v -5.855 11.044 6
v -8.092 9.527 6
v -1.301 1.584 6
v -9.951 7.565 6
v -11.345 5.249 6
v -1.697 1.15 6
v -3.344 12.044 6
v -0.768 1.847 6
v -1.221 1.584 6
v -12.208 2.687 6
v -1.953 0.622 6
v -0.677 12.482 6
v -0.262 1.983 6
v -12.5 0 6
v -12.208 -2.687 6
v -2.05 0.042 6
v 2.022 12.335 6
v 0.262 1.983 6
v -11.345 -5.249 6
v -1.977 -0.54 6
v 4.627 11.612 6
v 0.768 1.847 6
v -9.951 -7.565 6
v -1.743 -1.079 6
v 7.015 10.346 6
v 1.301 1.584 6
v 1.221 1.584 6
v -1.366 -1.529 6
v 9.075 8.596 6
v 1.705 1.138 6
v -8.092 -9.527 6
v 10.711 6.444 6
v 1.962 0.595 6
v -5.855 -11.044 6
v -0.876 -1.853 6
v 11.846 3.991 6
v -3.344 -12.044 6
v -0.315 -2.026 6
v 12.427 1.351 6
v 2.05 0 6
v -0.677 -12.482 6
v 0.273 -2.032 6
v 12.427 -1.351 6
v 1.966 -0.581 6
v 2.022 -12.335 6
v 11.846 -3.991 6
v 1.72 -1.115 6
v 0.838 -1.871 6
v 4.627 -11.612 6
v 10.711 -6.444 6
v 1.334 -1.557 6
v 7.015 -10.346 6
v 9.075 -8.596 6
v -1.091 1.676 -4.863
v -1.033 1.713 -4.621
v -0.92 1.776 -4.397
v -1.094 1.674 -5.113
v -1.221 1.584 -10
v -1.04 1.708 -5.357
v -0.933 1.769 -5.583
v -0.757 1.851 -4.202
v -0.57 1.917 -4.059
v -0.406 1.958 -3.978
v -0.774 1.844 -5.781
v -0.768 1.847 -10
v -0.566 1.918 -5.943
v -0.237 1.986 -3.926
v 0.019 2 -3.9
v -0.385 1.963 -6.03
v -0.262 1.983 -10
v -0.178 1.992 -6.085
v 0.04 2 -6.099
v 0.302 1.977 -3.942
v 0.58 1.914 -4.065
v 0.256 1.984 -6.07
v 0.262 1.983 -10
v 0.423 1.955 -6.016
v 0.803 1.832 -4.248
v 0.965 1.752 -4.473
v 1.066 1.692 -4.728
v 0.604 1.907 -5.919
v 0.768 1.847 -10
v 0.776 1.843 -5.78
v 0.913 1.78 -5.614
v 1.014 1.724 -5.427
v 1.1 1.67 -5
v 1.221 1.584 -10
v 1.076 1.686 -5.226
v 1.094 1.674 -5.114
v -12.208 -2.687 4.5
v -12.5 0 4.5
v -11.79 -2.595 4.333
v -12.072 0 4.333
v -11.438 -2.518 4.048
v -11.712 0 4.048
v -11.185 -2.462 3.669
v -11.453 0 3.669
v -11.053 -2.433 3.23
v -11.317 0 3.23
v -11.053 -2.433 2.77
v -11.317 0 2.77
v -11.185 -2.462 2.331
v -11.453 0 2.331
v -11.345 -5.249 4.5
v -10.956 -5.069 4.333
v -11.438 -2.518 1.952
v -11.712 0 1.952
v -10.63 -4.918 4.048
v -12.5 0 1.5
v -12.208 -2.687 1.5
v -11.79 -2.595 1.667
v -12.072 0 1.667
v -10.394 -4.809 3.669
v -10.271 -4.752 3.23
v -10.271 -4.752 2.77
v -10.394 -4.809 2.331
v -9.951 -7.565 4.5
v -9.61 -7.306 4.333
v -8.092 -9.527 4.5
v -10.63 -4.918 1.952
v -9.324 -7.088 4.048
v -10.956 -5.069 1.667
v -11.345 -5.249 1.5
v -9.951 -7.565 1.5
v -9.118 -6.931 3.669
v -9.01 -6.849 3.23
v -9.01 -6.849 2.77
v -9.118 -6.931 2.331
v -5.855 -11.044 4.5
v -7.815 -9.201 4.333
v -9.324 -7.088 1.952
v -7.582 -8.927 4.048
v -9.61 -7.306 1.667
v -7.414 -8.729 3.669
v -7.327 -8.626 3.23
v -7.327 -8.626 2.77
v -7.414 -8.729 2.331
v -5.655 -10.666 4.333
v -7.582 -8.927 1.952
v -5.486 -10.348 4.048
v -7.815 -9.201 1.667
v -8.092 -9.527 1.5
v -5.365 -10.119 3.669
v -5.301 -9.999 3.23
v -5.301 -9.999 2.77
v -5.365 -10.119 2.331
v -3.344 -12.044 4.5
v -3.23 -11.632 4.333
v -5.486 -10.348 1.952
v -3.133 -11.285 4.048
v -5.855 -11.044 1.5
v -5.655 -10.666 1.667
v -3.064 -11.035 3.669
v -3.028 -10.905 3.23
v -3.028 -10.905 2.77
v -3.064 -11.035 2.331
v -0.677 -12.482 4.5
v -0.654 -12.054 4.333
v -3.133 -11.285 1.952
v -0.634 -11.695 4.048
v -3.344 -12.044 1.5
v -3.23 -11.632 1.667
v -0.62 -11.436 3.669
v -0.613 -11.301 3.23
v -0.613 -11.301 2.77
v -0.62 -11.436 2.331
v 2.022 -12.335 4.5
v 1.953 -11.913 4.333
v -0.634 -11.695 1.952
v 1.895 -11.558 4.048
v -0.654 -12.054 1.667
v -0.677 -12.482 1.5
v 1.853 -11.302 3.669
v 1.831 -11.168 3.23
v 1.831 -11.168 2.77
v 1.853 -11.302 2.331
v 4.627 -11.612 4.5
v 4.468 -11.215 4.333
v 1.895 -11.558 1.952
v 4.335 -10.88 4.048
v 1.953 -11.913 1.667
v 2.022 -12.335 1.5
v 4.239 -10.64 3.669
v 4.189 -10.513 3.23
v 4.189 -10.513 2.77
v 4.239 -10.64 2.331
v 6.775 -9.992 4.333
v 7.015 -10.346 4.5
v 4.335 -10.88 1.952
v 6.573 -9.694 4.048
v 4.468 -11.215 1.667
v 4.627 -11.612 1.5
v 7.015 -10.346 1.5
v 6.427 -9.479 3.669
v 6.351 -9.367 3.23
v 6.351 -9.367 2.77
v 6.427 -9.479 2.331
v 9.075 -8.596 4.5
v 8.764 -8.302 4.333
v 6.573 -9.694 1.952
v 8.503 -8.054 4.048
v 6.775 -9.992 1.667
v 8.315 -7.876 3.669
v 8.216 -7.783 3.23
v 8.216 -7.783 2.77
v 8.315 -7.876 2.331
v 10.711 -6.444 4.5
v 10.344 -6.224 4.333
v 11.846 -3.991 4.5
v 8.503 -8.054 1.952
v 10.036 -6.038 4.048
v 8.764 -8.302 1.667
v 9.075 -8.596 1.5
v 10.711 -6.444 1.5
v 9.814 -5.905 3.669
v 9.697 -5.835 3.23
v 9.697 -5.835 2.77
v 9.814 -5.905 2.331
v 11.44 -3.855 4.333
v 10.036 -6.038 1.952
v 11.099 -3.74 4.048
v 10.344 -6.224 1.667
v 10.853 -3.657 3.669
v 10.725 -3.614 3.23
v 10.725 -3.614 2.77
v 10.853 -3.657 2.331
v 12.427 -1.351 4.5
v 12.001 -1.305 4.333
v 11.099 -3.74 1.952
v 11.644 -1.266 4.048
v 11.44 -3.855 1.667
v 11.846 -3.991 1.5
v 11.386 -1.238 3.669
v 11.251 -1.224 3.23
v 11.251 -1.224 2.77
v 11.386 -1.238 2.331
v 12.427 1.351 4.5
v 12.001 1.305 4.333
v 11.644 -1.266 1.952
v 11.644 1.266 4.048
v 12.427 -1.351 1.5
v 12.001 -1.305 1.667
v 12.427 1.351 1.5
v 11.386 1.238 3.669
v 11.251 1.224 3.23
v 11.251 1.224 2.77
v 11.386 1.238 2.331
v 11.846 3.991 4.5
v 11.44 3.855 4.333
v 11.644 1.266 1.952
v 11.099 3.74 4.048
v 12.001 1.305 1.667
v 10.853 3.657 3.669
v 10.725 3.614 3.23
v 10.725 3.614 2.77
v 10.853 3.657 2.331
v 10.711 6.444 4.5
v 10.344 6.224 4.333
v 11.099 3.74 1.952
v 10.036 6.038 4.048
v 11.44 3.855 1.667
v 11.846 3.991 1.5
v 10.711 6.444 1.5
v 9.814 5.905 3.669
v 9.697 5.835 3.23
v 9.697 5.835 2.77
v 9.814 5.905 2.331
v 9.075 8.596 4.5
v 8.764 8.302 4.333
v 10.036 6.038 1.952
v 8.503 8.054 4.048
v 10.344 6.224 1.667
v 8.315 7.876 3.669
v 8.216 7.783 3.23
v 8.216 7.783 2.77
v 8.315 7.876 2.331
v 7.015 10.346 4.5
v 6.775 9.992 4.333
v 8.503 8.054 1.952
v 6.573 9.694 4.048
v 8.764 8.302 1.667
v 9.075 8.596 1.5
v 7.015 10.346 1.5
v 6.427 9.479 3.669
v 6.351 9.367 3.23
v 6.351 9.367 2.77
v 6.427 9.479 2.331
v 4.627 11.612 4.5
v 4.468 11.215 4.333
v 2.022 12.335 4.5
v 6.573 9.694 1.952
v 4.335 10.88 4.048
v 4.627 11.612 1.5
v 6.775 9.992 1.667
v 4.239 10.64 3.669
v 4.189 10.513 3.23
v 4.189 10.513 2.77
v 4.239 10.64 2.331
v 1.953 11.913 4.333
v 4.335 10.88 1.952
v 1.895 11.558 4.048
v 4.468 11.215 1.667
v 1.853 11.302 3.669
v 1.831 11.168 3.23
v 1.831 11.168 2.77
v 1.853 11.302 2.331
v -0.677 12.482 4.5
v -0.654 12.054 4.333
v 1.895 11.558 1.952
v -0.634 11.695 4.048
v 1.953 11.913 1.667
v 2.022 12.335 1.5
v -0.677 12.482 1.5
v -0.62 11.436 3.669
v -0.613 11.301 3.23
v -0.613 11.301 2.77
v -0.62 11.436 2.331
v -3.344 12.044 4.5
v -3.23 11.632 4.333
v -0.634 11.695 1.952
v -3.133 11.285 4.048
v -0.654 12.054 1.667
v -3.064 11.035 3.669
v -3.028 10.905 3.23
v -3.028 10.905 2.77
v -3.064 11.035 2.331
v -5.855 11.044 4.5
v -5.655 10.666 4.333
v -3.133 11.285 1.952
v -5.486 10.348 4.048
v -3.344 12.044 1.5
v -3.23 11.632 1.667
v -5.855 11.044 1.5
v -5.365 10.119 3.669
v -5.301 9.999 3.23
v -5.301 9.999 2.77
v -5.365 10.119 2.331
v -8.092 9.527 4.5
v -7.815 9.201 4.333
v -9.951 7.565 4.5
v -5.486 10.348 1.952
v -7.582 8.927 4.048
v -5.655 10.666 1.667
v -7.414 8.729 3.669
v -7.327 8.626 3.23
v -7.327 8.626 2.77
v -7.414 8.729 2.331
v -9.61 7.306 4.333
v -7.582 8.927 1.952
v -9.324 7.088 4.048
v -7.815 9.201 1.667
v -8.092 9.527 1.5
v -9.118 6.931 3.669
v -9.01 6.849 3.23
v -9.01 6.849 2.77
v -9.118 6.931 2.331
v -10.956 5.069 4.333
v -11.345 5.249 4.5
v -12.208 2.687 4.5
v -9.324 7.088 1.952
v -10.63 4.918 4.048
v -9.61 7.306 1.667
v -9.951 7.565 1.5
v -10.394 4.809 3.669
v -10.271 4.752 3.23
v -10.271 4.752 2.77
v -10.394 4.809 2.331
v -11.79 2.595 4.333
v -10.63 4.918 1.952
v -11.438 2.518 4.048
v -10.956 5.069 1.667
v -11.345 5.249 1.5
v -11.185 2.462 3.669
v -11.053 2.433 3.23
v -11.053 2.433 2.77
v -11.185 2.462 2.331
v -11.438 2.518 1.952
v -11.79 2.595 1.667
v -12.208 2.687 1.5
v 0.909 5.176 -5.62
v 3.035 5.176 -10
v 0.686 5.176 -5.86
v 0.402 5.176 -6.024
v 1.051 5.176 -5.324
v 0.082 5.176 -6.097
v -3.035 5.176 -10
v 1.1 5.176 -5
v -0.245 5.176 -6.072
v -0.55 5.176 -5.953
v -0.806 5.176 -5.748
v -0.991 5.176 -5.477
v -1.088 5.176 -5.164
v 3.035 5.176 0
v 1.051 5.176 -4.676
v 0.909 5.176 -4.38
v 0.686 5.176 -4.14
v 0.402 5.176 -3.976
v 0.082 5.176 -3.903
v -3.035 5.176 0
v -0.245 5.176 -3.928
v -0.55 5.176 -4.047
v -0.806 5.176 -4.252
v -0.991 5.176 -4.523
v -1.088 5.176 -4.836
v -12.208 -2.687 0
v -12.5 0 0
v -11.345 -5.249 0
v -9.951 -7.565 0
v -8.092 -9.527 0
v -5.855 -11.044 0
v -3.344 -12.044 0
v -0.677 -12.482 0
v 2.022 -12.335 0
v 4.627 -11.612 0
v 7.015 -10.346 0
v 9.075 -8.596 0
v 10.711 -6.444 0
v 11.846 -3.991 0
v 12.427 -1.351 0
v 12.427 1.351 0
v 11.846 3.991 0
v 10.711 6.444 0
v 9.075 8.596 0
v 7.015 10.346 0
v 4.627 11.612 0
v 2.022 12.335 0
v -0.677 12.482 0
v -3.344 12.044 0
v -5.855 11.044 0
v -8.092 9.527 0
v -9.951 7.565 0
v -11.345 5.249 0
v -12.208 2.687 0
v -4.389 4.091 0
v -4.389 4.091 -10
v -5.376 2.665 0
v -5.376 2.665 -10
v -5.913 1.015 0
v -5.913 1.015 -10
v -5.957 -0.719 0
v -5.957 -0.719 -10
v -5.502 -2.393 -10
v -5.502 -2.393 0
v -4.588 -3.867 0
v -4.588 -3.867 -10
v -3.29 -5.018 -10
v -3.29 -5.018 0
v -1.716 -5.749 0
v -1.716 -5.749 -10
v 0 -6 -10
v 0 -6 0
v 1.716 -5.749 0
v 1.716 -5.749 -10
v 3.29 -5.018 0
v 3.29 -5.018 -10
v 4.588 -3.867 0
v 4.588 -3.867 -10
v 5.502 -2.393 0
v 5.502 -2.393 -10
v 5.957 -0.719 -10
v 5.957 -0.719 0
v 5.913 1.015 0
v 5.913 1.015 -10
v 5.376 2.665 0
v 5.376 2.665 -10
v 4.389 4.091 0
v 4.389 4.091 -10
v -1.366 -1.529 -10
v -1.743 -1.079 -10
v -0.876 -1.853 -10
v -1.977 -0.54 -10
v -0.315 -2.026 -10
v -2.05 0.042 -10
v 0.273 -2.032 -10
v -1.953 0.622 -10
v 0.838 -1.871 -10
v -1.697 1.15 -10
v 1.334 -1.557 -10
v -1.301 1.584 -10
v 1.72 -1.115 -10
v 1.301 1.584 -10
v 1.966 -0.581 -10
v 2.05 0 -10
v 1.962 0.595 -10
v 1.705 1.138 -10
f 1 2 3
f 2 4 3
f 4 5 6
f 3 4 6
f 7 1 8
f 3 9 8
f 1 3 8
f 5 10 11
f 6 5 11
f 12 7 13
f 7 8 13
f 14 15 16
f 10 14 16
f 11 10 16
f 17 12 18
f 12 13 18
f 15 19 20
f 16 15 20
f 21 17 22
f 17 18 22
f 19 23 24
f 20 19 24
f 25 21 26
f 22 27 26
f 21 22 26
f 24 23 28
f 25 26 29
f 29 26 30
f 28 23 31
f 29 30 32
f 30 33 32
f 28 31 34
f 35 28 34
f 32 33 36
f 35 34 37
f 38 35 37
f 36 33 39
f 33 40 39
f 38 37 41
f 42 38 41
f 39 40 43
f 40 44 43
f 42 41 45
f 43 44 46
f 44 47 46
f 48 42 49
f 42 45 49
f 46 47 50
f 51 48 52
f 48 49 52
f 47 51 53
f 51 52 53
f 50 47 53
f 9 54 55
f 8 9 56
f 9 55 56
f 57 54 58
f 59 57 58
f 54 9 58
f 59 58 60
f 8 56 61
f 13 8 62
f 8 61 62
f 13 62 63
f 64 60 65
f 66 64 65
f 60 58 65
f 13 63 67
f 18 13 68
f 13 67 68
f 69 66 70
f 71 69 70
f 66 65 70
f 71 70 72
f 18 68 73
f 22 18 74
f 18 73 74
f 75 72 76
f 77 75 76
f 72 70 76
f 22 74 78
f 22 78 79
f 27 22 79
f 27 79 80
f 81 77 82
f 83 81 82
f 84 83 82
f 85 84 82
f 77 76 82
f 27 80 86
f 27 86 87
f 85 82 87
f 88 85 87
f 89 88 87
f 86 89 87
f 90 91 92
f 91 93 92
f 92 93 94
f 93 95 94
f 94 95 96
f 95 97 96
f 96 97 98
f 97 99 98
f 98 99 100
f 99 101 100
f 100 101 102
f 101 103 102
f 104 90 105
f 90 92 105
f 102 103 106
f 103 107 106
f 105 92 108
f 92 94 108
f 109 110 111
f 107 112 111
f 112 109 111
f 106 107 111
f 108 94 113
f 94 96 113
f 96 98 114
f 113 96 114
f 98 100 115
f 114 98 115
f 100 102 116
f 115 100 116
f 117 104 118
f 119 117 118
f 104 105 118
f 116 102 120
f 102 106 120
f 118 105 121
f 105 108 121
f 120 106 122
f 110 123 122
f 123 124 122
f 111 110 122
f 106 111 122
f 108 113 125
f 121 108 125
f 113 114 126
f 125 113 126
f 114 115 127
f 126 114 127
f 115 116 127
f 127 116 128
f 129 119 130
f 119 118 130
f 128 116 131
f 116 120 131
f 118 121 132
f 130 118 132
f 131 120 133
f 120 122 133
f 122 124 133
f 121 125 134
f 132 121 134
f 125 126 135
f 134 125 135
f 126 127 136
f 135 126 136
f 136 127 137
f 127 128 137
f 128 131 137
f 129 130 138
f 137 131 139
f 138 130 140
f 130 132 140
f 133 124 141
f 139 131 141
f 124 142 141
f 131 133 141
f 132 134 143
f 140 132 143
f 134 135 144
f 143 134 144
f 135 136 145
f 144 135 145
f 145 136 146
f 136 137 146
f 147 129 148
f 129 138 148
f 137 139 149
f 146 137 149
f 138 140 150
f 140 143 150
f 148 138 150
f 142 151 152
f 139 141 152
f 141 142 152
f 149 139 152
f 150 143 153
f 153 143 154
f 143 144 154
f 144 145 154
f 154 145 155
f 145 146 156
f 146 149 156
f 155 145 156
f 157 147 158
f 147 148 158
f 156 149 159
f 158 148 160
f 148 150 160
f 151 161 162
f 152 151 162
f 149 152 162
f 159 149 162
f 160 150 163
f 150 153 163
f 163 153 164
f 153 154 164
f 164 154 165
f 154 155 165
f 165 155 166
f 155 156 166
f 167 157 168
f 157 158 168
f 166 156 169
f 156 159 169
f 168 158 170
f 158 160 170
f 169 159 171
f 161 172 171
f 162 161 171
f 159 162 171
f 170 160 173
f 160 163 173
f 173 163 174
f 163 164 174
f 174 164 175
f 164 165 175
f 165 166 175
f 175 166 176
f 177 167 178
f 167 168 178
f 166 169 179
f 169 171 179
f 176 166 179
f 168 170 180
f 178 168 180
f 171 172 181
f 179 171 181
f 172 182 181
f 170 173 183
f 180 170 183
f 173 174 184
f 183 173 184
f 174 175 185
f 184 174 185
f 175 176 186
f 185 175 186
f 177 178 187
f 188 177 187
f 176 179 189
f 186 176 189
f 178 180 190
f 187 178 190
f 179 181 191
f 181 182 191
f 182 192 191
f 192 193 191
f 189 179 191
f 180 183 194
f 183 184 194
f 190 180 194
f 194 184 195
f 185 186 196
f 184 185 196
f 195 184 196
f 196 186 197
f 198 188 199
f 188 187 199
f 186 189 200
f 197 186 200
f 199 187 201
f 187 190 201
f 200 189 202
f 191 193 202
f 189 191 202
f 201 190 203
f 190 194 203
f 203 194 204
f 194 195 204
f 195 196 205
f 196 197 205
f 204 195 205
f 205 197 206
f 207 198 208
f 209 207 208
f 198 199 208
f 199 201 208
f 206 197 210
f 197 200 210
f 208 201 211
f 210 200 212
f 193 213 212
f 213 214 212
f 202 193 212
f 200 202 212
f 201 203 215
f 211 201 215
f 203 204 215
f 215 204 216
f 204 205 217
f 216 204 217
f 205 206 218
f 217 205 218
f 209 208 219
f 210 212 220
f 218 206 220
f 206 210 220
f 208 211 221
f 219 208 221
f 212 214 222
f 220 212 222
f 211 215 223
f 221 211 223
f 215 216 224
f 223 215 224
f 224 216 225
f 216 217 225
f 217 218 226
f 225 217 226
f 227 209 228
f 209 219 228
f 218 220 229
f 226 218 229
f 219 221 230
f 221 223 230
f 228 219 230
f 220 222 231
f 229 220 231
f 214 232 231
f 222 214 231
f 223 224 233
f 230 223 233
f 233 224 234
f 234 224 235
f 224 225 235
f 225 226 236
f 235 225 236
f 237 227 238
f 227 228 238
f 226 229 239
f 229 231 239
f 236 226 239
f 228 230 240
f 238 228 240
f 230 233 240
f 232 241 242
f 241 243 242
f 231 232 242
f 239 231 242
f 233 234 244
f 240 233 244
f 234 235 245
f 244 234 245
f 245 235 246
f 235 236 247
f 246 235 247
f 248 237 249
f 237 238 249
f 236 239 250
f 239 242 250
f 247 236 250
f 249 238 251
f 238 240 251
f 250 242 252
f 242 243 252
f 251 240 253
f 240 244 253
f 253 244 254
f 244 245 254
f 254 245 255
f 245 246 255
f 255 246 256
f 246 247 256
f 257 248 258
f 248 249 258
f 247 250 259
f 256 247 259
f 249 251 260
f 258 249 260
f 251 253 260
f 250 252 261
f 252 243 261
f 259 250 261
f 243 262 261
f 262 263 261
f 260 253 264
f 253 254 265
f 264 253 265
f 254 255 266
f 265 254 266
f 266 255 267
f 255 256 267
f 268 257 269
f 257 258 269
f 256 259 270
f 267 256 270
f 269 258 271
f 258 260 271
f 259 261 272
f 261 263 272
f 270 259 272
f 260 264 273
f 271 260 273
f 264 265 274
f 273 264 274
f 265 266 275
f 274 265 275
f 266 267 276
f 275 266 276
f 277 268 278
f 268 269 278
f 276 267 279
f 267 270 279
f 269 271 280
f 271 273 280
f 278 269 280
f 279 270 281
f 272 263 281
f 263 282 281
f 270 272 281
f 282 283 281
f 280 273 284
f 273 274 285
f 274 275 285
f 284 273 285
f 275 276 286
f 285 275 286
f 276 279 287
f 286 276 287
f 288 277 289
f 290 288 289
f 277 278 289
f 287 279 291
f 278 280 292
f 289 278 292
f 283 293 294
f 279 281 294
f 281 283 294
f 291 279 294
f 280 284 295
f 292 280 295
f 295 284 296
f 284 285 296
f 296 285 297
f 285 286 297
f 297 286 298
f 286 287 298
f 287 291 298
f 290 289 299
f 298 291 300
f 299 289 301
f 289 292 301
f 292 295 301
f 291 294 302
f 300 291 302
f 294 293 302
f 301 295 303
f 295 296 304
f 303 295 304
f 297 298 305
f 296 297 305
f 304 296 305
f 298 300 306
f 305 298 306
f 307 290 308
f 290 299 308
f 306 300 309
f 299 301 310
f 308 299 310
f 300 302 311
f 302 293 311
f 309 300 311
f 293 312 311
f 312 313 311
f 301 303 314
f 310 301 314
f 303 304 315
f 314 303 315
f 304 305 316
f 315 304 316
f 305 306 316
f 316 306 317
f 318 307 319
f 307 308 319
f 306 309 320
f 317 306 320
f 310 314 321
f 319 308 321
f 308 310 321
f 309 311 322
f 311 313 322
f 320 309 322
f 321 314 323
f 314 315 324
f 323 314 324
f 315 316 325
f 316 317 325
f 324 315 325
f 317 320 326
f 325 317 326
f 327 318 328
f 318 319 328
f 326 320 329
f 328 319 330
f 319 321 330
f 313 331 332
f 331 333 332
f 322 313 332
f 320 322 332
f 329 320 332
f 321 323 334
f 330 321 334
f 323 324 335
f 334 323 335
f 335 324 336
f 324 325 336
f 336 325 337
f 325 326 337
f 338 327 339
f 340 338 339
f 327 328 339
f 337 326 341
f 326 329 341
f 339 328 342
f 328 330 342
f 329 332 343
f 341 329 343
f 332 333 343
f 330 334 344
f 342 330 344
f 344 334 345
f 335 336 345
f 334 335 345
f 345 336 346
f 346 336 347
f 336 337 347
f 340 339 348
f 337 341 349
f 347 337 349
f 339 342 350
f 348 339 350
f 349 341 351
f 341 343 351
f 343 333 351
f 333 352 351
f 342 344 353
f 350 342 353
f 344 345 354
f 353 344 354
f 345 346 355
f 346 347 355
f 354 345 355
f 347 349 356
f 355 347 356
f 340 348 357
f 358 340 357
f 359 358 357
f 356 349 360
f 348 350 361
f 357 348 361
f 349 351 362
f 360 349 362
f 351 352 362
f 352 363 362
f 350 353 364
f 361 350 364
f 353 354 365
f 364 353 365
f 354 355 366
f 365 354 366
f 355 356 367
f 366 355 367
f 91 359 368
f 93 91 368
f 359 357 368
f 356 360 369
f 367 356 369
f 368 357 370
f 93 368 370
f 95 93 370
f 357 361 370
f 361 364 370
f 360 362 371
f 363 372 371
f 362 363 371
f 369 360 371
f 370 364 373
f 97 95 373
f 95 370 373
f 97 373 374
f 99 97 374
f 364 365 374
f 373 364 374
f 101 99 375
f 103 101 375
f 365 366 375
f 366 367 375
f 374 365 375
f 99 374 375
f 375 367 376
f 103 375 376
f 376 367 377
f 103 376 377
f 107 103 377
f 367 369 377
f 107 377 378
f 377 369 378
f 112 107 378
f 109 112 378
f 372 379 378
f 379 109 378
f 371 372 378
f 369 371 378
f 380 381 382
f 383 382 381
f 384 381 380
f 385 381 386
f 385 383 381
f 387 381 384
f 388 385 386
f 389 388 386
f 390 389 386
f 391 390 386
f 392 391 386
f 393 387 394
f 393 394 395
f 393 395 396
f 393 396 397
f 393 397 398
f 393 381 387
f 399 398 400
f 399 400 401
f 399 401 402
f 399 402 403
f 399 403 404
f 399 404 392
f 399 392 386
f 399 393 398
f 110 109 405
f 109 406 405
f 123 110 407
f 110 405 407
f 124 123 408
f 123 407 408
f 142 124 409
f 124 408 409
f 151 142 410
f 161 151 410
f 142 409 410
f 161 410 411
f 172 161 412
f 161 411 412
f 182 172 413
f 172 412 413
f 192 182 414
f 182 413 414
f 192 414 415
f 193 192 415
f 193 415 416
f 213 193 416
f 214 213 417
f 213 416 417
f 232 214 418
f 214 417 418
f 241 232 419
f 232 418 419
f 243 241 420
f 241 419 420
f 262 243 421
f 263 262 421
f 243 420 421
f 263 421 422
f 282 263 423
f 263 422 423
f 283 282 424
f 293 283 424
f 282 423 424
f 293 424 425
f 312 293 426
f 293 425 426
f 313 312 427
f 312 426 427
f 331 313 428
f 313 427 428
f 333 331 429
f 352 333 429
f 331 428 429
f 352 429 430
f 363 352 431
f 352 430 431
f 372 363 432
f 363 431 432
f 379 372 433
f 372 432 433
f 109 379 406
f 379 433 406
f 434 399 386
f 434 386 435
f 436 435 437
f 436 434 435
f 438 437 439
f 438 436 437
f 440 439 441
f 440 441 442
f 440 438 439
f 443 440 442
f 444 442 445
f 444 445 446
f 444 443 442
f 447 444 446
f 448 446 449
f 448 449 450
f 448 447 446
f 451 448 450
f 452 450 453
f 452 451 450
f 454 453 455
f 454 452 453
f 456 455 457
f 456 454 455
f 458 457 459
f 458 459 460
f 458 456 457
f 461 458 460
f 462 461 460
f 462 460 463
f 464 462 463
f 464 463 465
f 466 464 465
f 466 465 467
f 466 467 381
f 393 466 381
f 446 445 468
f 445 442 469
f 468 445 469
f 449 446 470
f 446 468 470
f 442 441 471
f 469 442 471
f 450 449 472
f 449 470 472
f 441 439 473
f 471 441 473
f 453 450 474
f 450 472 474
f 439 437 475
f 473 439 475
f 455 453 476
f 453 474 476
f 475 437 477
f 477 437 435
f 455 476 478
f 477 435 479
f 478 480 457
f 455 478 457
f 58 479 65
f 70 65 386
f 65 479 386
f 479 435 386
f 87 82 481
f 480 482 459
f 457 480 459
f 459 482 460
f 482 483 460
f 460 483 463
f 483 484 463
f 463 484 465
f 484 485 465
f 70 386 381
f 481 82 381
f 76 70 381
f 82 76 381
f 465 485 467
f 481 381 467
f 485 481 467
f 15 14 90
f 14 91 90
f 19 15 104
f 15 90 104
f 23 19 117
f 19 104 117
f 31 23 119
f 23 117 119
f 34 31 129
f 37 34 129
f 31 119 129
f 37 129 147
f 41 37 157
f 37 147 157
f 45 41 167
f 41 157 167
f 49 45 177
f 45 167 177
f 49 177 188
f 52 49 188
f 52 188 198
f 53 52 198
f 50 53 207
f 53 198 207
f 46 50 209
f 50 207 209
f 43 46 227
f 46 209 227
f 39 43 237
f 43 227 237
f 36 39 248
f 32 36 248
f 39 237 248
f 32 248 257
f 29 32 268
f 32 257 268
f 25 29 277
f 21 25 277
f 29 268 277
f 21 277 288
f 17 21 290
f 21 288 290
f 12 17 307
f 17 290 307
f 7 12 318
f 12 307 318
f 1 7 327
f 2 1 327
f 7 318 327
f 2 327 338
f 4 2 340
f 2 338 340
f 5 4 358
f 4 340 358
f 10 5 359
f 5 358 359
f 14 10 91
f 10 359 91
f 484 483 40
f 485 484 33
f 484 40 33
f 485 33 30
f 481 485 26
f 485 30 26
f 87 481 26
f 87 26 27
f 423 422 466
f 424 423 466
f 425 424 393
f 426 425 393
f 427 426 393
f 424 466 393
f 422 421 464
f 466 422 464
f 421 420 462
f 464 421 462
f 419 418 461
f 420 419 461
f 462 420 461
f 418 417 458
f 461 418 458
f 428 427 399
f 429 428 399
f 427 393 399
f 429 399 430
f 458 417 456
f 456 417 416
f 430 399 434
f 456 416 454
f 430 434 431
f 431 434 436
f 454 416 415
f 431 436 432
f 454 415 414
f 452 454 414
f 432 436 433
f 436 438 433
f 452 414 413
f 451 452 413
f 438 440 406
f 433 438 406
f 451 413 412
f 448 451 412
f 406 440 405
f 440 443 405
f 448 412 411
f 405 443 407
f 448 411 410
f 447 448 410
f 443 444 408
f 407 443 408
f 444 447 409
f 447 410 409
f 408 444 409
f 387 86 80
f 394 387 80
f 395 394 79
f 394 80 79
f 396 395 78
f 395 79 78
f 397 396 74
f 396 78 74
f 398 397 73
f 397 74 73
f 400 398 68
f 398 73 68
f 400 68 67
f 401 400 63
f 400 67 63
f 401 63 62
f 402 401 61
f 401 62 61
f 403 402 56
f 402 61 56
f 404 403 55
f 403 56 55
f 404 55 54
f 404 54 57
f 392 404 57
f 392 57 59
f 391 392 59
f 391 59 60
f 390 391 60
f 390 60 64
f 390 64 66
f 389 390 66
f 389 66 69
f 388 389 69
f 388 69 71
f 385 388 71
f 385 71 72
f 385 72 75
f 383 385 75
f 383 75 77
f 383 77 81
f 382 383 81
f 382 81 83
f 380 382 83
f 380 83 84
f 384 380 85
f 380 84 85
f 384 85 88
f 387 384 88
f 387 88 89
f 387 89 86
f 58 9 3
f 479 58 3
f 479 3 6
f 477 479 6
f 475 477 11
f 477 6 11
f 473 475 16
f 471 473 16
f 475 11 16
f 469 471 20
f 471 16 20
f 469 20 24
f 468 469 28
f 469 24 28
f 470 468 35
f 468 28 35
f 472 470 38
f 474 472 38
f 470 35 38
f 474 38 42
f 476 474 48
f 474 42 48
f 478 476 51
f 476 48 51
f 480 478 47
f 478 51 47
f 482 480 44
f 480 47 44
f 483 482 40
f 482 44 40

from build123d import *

# Parameters (mm, degrees)
F4_DEPTH = 10
F5_DEPTH = 16.001
F7_D     = 2.2
F7_DEPTH = 4
F8_D     = 4


with BuildPart() as f1:
    # F0 (on Front) → F1 (revolve)
    with BuildSketch(Plane.XZ):
        with BuildLine():
            Line((-12.5, 0), (0, 0))
            Line((0, 0), (0, 6))
            Line((0, 6), (-12.5, 6))
            Line((-12.5, 6), (-12.5, 4.5))
            ThreePointArc((-12.5, 4.5), (-11.3, 3), (-12.5, 1.5))
            Line((-12.5, 1.5), (-12.5, 0))
        make_face()
    revolve(axis=Axis((0, 0, 3), (0, 0, 1)))

    # F3 (on Top) → F4 (join)
    with BuildSketch(Plane.XY):
        with BuildLine():
            Line((3.0351, 5.175729), (-3.0351, 5.175729))
            ThreePointArc((-3.0351, 5.175729), (0, -6), (3.0351, 5.175729))
        make_face()
    extrude(amount=-F4_DEPTH)

    # F2 (on face) → F5 (cut, through all)
    with BuildSketch(Plane.XY.offset(6)):
        with BuildLine():
            ThreePointArc((-1.301243, 1.584066), (-0.876057, -1.853382), (2.05, 0))
            ThreePointArc((2.05, 0), (1.853382, 0.876057), (1.301243, 1.584066))
            Line((1.301243, 1.584066), (-1.301243, 1.584066))
        make_face()
    extrude(amount=-F5_DEPTH, mode=Mode.SUBTRACT)

    # F7
    with Locations(Plane(origin=(0, 5.175729, 0), x_dir=(-1, 0, 0), z_dir=(0, 1, 0))):
        with Locations((0, -5)):
            Hole(F7_D / 2, depth=F7_DEPTH)

    # F8 (through all)
    with Locations(Plane.XY.offset(6)):
        with Locations((0, 0)):
            Hole(F8_D / 2)


solid = f1.part
